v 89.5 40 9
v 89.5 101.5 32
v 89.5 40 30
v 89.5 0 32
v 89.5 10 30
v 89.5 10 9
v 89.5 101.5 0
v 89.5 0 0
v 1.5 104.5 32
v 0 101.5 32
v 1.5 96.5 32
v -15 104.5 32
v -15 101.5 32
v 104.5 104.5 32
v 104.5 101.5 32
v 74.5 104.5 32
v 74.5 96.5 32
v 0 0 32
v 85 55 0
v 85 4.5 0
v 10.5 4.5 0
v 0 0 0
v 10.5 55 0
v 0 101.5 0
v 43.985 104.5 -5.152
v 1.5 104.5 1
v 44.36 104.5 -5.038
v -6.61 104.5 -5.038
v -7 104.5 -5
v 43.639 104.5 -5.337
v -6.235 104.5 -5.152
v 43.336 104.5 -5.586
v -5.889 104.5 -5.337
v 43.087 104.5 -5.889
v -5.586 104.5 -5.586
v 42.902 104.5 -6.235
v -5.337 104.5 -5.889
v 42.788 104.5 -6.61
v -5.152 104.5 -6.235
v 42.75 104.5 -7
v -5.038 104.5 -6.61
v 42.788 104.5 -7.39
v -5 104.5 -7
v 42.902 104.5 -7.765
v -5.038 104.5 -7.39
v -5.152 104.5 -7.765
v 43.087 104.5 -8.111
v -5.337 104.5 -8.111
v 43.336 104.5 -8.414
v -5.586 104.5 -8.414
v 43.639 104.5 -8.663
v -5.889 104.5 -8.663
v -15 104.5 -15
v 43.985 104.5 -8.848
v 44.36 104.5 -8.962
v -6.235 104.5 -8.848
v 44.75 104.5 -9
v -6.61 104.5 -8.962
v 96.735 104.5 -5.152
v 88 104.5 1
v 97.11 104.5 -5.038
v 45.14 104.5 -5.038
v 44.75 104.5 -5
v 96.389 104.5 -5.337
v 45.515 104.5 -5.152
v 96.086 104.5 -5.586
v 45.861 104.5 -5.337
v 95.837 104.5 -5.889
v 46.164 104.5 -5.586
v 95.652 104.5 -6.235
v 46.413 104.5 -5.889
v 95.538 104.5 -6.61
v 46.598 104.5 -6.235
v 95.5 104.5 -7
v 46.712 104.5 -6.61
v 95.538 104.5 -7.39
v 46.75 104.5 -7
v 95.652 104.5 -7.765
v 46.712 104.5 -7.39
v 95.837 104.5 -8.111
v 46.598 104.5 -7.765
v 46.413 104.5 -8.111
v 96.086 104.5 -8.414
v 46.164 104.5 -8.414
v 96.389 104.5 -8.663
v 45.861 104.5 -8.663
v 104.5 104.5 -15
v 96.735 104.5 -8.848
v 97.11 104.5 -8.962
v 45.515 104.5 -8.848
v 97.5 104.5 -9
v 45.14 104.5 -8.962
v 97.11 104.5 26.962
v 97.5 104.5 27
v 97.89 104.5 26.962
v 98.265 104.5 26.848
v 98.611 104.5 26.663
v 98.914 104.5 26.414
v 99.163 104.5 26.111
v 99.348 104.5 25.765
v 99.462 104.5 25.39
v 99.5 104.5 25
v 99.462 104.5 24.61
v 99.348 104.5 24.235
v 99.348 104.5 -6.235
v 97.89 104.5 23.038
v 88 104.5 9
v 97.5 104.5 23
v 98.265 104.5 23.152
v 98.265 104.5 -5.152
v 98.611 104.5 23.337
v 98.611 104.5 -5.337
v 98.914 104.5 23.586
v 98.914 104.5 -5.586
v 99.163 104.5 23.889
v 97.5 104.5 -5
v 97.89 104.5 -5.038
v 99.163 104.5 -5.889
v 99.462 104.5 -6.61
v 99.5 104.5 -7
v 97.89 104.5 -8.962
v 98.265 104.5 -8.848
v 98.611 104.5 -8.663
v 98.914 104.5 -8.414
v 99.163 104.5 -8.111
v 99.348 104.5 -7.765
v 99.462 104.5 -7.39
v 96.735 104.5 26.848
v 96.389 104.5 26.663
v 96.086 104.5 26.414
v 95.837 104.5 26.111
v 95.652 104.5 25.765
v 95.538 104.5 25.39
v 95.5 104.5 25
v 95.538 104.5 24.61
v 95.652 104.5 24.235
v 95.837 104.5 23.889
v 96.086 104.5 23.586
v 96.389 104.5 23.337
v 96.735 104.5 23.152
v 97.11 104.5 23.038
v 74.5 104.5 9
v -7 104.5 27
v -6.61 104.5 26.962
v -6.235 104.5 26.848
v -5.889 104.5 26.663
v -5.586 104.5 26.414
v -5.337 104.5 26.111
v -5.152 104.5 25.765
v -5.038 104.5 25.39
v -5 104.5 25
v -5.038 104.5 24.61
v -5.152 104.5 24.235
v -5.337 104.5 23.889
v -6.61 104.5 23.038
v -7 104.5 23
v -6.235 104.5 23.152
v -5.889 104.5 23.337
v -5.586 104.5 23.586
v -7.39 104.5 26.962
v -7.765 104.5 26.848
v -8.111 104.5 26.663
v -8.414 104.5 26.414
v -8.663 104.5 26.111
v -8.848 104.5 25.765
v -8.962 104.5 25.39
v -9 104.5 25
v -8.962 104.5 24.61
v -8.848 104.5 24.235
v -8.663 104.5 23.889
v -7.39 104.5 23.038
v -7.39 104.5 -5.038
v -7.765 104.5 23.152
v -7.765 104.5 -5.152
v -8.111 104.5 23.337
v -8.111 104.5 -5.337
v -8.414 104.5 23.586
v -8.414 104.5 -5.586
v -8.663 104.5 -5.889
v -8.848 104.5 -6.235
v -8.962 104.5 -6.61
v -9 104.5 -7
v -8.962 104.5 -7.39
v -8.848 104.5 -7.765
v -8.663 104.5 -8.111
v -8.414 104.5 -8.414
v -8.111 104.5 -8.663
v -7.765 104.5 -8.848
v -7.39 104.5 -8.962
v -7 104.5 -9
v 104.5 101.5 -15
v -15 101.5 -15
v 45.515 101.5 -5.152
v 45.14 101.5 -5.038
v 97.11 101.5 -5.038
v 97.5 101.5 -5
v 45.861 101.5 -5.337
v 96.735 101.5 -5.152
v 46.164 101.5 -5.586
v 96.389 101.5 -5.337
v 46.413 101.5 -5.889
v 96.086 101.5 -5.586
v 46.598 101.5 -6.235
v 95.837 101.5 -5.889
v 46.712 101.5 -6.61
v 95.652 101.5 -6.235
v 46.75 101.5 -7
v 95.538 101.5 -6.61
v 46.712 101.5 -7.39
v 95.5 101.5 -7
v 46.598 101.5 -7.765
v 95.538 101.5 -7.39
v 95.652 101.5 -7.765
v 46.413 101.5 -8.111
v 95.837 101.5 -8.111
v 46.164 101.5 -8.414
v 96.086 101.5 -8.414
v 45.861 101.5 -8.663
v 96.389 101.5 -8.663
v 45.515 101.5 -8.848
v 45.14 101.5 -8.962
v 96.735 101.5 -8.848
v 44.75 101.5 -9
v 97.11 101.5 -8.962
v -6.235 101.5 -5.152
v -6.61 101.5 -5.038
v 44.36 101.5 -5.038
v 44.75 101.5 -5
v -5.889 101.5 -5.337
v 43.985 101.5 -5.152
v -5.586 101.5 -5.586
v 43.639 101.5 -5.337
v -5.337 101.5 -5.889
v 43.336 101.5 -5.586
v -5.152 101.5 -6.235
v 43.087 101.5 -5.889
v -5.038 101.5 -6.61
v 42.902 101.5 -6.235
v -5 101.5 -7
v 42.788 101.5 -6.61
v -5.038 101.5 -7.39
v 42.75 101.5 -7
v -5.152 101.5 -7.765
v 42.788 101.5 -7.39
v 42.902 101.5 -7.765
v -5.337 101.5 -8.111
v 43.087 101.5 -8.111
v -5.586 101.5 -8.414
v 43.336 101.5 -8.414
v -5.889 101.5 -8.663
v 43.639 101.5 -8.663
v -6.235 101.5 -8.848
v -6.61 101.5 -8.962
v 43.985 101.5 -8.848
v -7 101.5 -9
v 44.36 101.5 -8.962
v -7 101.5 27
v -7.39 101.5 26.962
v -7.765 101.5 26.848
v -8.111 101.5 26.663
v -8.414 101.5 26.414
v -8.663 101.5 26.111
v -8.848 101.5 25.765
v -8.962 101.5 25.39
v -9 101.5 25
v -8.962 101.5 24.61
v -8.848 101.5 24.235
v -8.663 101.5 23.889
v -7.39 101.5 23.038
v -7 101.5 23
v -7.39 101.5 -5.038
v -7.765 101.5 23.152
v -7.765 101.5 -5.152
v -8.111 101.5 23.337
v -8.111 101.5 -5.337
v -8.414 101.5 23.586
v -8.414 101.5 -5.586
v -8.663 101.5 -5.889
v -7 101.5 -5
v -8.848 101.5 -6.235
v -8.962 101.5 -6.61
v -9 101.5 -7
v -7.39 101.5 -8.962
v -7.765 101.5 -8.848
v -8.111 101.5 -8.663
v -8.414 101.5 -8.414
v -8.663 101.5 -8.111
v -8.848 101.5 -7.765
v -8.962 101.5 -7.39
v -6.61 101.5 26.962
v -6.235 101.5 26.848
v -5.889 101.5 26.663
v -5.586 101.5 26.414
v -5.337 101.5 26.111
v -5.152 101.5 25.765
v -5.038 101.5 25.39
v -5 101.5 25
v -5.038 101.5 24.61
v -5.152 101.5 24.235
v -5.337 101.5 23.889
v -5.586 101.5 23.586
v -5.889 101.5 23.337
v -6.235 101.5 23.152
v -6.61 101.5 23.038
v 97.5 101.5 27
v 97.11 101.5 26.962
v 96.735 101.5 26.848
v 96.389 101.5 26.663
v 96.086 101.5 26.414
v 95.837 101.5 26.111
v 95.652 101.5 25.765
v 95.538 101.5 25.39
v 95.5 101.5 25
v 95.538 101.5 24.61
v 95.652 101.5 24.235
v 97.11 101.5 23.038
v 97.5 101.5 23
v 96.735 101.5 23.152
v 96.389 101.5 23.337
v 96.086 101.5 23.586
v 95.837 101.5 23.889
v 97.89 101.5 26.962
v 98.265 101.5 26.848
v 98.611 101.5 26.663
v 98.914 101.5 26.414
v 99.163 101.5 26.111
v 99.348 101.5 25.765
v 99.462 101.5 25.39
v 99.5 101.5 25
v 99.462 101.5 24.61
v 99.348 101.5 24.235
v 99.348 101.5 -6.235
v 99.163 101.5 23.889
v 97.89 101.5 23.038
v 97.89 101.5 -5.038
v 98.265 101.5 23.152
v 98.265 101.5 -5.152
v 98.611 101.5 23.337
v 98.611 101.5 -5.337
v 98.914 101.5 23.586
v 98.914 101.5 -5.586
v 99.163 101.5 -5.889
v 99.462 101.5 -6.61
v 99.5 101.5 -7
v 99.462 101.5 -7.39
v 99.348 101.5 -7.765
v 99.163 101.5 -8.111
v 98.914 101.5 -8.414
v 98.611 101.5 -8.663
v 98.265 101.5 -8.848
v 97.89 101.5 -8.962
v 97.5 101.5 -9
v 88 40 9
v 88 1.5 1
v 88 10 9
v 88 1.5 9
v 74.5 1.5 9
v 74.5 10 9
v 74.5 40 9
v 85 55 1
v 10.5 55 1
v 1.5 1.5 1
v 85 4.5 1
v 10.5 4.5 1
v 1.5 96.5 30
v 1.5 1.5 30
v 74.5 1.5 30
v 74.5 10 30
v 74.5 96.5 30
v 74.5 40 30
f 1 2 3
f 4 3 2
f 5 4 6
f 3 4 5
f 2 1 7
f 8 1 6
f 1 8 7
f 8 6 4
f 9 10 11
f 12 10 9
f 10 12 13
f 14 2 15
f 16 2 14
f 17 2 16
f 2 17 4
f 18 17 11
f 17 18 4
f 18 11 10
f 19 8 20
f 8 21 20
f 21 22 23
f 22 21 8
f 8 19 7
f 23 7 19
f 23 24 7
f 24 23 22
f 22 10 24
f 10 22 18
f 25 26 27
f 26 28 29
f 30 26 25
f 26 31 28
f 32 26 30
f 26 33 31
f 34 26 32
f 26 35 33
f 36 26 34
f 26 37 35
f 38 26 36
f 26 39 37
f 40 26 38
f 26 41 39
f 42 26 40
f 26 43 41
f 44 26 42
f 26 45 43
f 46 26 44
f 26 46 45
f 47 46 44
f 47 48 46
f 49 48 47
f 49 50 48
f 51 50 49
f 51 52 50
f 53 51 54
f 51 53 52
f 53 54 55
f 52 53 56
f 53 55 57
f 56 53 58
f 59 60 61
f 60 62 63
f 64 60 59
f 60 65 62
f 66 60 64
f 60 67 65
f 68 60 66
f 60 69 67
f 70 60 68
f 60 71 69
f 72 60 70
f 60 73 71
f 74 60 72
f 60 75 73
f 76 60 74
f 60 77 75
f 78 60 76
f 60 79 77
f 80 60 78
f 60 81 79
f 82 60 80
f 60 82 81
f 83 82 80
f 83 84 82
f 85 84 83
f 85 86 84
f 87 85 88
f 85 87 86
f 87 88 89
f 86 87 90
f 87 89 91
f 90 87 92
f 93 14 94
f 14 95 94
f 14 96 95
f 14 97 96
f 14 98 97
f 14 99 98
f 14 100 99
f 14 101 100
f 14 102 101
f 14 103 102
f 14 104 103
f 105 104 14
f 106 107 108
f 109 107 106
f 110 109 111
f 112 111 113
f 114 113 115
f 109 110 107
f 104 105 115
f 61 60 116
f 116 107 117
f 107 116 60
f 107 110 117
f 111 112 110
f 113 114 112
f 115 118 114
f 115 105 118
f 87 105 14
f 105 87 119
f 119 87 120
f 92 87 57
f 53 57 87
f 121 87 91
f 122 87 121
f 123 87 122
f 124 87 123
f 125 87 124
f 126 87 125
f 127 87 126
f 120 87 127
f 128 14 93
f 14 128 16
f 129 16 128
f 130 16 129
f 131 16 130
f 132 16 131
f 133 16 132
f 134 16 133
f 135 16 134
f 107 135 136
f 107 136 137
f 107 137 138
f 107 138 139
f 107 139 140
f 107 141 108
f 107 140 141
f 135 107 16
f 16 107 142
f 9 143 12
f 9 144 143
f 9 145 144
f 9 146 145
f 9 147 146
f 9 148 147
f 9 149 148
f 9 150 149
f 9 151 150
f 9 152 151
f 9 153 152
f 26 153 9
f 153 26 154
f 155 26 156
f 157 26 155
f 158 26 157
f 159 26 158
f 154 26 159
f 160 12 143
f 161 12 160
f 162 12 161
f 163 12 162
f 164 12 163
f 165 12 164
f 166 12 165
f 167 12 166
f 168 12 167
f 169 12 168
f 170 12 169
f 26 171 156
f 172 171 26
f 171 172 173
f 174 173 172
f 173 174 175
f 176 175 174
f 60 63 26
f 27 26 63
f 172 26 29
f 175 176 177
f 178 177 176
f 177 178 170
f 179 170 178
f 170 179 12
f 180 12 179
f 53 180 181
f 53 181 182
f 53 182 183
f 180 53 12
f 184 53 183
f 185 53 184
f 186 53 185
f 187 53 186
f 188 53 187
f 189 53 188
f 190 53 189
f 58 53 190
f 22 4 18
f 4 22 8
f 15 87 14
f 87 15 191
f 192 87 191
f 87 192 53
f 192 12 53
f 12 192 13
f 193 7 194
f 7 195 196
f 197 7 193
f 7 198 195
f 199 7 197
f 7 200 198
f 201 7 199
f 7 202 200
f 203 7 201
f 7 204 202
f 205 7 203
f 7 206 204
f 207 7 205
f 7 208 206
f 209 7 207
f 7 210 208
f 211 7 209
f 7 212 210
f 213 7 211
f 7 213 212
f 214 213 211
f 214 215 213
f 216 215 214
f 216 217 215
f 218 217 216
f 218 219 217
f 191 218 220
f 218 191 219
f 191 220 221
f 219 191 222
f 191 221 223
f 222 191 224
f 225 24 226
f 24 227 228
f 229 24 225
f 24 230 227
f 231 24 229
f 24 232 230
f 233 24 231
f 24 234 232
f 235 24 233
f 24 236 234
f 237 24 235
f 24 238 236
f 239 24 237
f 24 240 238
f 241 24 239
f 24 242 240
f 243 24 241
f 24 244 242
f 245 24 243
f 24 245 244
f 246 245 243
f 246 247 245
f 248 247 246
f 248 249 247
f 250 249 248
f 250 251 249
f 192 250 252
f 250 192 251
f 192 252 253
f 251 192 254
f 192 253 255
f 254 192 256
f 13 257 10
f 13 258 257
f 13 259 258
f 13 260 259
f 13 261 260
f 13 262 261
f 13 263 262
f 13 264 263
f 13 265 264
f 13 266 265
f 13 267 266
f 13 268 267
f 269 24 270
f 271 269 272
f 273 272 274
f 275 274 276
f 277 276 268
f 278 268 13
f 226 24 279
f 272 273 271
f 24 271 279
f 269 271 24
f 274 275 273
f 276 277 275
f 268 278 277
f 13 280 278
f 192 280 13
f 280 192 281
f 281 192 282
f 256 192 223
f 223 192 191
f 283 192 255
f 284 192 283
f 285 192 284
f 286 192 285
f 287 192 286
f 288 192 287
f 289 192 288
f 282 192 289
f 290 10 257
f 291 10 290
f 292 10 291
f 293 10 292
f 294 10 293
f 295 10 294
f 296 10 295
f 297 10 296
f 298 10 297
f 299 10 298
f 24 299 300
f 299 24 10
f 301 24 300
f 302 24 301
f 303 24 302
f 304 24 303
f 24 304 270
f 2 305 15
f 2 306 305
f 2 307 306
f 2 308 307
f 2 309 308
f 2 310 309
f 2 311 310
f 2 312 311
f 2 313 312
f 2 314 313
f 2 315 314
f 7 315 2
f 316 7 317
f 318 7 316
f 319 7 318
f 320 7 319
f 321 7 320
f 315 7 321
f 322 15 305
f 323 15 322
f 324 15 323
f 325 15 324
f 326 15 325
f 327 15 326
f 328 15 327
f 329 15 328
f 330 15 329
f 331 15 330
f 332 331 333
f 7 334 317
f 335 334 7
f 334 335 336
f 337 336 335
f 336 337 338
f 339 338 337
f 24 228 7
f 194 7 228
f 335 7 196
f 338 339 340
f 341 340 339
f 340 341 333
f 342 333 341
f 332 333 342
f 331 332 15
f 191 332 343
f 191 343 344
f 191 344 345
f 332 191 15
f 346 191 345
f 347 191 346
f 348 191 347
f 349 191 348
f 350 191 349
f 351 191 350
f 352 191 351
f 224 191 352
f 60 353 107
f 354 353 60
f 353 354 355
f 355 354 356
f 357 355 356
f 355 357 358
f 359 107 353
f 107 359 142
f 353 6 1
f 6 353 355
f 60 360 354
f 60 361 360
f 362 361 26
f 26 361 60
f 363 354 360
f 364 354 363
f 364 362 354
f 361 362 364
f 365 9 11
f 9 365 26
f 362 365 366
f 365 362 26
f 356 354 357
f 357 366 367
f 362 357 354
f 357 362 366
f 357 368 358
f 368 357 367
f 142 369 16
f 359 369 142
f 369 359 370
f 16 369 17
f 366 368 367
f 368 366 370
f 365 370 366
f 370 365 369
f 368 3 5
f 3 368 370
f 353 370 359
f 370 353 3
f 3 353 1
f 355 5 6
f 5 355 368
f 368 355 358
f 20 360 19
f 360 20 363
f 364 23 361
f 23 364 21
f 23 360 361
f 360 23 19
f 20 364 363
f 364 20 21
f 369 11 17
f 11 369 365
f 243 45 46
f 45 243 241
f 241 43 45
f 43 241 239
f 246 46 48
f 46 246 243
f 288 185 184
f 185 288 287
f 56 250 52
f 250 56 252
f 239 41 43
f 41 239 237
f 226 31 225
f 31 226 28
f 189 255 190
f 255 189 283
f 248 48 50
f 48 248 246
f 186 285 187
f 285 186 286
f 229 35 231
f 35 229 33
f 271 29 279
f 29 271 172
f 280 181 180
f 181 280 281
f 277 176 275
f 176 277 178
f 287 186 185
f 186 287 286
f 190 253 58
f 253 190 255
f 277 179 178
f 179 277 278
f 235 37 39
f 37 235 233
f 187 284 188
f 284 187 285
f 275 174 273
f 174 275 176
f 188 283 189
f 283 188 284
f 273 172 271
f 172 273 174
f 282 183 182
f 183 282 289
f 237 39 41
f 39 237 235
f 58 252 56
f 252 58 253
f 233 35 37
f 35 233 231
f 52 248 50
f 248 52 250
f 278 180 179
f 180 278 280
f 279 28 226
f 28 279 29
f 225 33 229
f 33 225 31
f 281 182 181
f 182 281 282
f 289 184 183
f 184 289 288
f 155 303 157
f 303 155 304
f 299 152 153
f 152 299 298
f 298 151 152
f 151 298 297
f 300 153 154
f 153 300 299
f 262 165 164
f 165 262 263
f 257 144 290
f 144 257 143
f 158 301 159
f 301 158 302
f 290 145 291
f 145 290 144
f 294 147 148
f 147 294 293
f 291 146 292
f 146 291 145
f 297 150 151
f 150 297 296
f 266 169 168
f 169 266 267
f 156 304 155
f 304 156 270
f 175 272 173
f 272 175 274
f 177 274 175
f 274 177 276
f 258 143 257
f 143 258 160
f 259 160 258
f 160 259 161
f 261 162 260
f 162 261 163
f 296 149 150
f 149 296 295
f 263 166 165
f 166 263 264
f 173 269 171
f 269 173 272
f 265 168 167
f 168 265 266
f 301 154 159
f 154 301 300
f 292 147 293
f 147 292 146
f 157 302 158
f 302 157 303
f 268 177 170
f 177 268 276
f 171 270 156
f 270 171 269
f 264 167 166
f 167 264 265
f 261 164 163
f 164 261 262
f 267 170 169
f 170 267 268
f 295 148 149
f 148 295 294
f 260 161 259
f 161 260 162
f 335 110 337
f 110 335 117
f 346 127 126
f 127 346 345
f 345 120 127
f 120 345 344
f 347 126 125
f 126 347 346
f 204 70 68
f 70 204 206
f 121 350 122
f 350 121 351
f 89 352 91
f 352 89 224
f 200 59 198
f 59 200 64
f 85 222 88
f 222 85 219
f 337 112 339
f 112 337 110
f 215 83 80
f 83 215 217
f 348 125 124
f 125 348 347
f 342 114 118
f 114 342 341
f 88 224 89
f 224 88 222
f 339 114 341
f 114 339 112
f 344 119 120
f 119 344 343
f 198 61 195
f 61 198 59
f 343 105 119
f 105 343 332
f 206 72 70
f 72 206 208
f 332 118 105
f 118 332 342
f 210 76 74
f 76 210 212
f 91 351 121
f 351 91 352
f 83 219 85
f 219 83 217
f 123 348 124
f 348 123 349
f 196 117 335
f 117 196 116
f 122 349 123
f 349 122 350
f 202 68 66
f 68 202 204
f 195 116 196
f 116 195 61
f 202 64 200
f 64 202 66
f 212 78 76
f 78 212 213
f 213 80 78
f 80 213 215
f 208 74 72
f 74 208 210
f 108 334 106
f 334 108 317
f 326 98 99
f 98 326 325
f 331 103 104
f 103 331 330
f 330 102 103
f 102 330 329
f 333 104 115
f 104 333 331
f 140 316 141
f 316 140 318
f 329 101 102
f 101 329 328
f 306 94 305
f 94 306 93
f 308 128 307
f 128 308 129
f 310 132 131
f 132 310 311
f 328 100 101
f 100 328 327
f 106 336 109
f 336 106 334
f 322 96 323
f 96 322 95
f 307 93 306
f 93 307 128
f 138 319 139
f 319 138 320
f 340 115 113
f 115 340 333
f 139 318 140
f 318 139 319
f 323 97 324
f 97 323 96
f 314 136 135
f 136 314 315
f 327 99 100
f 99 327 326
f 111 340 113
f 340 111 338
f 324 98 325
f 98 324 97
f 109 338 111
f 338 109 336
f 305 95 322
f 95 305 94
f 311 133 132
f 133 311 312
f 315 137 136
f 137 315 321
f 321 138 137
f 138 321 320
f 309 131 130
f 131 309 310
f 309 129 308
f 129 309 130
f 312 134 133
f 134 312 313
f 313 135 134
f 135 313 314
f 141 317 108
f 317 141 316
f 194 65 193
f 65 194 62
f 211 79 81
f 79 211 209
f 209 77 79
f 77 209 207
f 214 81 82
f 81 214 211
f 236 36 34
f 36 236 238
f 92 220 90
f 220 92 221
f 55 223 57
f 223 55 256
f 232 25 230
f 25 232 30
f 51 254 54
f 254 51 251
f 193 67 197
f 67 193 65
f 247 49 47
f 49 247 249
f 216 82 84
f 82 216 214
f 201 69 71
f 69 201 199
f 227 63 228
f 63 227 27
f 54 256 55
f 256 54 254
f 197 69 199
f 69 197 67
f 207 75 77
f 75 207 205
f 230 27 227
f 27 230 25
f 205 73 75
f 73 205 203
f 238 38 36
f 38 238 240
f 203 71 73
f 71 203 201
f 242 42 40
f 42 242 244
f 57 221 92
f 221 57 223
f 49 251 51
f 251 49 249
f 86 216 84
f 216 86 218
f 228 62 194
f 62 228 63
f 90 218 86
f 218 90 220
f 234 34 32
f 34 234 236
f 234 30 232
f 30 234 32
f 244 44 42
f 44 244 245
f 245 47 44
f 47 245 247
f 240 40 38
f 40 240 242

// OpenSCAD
display = [85.5, 55.5, 7]+[1,1,1];
lcd = [74.5, 50.5, 5];
rpi = [70, 59, 20]+[3,1,1];
thick = 1.5;
border=7;
drill = 4;
$fn=32;

difference() {
    union() {
        cube([display[0], display[1] + 45, display[2] + rpi[2]] + [2 * thick, 2 * thick, 2 * thick]);
        translate([- 15, display[1] + 45, - 15]) cube([display[0] + 30 + 2 * thick, 2 * thick, display[2] + rpi[2] + 15
            + 2 * thick]);
    }
    translate([thick, thick, 1]) cube(display + [0, 20 + 45, 0]);
    translate([thick, thick, 1 + display[2]]) cube(rpi + [0, 20 + 45, 0]);
    translate([40, 10, 1 + display[2]]) cube([50, 30, rpi[2]]);
    translate([(display[0] - lcd[0]) - thick, thick + (display[1] - lcd[1]) / 2, - 1]) cube(lcd);
    translate([thick, display[1] + 45 -5, display[2] + rpi[2]]) cube([rpi[0], 50, 10]);

    translate([- border, - 1, - border]) rotate([- 90, 0, 0]) cylinder(d = drill, h = 200);
        translate([- border, - 1, display[2] + rpi[2] + 2 * thick - border]) rotate([- 90, 0, 0]) cylinder(d = drill, h = 200);
    translate([display[0] + 30 + 2 * thick - border - 15, - 1, - border]) rotate([- 90, 0, 0]) cylinder(d = drill, h = 200);
    translate([display[0] + 30 + 2 * thick - border - 15, - 1, display[2] + rpi[2] + 2 * thick - border]) rotate([- 90, 0, 0])
        cylinder(d = drill, h = 200);
    translate([(display[0] + 30 + 2 * thick) / 2 - 15, - 1, - border]) rotate([- 90, 0, 0]) cylinder(d = drill, h = 200);
}
